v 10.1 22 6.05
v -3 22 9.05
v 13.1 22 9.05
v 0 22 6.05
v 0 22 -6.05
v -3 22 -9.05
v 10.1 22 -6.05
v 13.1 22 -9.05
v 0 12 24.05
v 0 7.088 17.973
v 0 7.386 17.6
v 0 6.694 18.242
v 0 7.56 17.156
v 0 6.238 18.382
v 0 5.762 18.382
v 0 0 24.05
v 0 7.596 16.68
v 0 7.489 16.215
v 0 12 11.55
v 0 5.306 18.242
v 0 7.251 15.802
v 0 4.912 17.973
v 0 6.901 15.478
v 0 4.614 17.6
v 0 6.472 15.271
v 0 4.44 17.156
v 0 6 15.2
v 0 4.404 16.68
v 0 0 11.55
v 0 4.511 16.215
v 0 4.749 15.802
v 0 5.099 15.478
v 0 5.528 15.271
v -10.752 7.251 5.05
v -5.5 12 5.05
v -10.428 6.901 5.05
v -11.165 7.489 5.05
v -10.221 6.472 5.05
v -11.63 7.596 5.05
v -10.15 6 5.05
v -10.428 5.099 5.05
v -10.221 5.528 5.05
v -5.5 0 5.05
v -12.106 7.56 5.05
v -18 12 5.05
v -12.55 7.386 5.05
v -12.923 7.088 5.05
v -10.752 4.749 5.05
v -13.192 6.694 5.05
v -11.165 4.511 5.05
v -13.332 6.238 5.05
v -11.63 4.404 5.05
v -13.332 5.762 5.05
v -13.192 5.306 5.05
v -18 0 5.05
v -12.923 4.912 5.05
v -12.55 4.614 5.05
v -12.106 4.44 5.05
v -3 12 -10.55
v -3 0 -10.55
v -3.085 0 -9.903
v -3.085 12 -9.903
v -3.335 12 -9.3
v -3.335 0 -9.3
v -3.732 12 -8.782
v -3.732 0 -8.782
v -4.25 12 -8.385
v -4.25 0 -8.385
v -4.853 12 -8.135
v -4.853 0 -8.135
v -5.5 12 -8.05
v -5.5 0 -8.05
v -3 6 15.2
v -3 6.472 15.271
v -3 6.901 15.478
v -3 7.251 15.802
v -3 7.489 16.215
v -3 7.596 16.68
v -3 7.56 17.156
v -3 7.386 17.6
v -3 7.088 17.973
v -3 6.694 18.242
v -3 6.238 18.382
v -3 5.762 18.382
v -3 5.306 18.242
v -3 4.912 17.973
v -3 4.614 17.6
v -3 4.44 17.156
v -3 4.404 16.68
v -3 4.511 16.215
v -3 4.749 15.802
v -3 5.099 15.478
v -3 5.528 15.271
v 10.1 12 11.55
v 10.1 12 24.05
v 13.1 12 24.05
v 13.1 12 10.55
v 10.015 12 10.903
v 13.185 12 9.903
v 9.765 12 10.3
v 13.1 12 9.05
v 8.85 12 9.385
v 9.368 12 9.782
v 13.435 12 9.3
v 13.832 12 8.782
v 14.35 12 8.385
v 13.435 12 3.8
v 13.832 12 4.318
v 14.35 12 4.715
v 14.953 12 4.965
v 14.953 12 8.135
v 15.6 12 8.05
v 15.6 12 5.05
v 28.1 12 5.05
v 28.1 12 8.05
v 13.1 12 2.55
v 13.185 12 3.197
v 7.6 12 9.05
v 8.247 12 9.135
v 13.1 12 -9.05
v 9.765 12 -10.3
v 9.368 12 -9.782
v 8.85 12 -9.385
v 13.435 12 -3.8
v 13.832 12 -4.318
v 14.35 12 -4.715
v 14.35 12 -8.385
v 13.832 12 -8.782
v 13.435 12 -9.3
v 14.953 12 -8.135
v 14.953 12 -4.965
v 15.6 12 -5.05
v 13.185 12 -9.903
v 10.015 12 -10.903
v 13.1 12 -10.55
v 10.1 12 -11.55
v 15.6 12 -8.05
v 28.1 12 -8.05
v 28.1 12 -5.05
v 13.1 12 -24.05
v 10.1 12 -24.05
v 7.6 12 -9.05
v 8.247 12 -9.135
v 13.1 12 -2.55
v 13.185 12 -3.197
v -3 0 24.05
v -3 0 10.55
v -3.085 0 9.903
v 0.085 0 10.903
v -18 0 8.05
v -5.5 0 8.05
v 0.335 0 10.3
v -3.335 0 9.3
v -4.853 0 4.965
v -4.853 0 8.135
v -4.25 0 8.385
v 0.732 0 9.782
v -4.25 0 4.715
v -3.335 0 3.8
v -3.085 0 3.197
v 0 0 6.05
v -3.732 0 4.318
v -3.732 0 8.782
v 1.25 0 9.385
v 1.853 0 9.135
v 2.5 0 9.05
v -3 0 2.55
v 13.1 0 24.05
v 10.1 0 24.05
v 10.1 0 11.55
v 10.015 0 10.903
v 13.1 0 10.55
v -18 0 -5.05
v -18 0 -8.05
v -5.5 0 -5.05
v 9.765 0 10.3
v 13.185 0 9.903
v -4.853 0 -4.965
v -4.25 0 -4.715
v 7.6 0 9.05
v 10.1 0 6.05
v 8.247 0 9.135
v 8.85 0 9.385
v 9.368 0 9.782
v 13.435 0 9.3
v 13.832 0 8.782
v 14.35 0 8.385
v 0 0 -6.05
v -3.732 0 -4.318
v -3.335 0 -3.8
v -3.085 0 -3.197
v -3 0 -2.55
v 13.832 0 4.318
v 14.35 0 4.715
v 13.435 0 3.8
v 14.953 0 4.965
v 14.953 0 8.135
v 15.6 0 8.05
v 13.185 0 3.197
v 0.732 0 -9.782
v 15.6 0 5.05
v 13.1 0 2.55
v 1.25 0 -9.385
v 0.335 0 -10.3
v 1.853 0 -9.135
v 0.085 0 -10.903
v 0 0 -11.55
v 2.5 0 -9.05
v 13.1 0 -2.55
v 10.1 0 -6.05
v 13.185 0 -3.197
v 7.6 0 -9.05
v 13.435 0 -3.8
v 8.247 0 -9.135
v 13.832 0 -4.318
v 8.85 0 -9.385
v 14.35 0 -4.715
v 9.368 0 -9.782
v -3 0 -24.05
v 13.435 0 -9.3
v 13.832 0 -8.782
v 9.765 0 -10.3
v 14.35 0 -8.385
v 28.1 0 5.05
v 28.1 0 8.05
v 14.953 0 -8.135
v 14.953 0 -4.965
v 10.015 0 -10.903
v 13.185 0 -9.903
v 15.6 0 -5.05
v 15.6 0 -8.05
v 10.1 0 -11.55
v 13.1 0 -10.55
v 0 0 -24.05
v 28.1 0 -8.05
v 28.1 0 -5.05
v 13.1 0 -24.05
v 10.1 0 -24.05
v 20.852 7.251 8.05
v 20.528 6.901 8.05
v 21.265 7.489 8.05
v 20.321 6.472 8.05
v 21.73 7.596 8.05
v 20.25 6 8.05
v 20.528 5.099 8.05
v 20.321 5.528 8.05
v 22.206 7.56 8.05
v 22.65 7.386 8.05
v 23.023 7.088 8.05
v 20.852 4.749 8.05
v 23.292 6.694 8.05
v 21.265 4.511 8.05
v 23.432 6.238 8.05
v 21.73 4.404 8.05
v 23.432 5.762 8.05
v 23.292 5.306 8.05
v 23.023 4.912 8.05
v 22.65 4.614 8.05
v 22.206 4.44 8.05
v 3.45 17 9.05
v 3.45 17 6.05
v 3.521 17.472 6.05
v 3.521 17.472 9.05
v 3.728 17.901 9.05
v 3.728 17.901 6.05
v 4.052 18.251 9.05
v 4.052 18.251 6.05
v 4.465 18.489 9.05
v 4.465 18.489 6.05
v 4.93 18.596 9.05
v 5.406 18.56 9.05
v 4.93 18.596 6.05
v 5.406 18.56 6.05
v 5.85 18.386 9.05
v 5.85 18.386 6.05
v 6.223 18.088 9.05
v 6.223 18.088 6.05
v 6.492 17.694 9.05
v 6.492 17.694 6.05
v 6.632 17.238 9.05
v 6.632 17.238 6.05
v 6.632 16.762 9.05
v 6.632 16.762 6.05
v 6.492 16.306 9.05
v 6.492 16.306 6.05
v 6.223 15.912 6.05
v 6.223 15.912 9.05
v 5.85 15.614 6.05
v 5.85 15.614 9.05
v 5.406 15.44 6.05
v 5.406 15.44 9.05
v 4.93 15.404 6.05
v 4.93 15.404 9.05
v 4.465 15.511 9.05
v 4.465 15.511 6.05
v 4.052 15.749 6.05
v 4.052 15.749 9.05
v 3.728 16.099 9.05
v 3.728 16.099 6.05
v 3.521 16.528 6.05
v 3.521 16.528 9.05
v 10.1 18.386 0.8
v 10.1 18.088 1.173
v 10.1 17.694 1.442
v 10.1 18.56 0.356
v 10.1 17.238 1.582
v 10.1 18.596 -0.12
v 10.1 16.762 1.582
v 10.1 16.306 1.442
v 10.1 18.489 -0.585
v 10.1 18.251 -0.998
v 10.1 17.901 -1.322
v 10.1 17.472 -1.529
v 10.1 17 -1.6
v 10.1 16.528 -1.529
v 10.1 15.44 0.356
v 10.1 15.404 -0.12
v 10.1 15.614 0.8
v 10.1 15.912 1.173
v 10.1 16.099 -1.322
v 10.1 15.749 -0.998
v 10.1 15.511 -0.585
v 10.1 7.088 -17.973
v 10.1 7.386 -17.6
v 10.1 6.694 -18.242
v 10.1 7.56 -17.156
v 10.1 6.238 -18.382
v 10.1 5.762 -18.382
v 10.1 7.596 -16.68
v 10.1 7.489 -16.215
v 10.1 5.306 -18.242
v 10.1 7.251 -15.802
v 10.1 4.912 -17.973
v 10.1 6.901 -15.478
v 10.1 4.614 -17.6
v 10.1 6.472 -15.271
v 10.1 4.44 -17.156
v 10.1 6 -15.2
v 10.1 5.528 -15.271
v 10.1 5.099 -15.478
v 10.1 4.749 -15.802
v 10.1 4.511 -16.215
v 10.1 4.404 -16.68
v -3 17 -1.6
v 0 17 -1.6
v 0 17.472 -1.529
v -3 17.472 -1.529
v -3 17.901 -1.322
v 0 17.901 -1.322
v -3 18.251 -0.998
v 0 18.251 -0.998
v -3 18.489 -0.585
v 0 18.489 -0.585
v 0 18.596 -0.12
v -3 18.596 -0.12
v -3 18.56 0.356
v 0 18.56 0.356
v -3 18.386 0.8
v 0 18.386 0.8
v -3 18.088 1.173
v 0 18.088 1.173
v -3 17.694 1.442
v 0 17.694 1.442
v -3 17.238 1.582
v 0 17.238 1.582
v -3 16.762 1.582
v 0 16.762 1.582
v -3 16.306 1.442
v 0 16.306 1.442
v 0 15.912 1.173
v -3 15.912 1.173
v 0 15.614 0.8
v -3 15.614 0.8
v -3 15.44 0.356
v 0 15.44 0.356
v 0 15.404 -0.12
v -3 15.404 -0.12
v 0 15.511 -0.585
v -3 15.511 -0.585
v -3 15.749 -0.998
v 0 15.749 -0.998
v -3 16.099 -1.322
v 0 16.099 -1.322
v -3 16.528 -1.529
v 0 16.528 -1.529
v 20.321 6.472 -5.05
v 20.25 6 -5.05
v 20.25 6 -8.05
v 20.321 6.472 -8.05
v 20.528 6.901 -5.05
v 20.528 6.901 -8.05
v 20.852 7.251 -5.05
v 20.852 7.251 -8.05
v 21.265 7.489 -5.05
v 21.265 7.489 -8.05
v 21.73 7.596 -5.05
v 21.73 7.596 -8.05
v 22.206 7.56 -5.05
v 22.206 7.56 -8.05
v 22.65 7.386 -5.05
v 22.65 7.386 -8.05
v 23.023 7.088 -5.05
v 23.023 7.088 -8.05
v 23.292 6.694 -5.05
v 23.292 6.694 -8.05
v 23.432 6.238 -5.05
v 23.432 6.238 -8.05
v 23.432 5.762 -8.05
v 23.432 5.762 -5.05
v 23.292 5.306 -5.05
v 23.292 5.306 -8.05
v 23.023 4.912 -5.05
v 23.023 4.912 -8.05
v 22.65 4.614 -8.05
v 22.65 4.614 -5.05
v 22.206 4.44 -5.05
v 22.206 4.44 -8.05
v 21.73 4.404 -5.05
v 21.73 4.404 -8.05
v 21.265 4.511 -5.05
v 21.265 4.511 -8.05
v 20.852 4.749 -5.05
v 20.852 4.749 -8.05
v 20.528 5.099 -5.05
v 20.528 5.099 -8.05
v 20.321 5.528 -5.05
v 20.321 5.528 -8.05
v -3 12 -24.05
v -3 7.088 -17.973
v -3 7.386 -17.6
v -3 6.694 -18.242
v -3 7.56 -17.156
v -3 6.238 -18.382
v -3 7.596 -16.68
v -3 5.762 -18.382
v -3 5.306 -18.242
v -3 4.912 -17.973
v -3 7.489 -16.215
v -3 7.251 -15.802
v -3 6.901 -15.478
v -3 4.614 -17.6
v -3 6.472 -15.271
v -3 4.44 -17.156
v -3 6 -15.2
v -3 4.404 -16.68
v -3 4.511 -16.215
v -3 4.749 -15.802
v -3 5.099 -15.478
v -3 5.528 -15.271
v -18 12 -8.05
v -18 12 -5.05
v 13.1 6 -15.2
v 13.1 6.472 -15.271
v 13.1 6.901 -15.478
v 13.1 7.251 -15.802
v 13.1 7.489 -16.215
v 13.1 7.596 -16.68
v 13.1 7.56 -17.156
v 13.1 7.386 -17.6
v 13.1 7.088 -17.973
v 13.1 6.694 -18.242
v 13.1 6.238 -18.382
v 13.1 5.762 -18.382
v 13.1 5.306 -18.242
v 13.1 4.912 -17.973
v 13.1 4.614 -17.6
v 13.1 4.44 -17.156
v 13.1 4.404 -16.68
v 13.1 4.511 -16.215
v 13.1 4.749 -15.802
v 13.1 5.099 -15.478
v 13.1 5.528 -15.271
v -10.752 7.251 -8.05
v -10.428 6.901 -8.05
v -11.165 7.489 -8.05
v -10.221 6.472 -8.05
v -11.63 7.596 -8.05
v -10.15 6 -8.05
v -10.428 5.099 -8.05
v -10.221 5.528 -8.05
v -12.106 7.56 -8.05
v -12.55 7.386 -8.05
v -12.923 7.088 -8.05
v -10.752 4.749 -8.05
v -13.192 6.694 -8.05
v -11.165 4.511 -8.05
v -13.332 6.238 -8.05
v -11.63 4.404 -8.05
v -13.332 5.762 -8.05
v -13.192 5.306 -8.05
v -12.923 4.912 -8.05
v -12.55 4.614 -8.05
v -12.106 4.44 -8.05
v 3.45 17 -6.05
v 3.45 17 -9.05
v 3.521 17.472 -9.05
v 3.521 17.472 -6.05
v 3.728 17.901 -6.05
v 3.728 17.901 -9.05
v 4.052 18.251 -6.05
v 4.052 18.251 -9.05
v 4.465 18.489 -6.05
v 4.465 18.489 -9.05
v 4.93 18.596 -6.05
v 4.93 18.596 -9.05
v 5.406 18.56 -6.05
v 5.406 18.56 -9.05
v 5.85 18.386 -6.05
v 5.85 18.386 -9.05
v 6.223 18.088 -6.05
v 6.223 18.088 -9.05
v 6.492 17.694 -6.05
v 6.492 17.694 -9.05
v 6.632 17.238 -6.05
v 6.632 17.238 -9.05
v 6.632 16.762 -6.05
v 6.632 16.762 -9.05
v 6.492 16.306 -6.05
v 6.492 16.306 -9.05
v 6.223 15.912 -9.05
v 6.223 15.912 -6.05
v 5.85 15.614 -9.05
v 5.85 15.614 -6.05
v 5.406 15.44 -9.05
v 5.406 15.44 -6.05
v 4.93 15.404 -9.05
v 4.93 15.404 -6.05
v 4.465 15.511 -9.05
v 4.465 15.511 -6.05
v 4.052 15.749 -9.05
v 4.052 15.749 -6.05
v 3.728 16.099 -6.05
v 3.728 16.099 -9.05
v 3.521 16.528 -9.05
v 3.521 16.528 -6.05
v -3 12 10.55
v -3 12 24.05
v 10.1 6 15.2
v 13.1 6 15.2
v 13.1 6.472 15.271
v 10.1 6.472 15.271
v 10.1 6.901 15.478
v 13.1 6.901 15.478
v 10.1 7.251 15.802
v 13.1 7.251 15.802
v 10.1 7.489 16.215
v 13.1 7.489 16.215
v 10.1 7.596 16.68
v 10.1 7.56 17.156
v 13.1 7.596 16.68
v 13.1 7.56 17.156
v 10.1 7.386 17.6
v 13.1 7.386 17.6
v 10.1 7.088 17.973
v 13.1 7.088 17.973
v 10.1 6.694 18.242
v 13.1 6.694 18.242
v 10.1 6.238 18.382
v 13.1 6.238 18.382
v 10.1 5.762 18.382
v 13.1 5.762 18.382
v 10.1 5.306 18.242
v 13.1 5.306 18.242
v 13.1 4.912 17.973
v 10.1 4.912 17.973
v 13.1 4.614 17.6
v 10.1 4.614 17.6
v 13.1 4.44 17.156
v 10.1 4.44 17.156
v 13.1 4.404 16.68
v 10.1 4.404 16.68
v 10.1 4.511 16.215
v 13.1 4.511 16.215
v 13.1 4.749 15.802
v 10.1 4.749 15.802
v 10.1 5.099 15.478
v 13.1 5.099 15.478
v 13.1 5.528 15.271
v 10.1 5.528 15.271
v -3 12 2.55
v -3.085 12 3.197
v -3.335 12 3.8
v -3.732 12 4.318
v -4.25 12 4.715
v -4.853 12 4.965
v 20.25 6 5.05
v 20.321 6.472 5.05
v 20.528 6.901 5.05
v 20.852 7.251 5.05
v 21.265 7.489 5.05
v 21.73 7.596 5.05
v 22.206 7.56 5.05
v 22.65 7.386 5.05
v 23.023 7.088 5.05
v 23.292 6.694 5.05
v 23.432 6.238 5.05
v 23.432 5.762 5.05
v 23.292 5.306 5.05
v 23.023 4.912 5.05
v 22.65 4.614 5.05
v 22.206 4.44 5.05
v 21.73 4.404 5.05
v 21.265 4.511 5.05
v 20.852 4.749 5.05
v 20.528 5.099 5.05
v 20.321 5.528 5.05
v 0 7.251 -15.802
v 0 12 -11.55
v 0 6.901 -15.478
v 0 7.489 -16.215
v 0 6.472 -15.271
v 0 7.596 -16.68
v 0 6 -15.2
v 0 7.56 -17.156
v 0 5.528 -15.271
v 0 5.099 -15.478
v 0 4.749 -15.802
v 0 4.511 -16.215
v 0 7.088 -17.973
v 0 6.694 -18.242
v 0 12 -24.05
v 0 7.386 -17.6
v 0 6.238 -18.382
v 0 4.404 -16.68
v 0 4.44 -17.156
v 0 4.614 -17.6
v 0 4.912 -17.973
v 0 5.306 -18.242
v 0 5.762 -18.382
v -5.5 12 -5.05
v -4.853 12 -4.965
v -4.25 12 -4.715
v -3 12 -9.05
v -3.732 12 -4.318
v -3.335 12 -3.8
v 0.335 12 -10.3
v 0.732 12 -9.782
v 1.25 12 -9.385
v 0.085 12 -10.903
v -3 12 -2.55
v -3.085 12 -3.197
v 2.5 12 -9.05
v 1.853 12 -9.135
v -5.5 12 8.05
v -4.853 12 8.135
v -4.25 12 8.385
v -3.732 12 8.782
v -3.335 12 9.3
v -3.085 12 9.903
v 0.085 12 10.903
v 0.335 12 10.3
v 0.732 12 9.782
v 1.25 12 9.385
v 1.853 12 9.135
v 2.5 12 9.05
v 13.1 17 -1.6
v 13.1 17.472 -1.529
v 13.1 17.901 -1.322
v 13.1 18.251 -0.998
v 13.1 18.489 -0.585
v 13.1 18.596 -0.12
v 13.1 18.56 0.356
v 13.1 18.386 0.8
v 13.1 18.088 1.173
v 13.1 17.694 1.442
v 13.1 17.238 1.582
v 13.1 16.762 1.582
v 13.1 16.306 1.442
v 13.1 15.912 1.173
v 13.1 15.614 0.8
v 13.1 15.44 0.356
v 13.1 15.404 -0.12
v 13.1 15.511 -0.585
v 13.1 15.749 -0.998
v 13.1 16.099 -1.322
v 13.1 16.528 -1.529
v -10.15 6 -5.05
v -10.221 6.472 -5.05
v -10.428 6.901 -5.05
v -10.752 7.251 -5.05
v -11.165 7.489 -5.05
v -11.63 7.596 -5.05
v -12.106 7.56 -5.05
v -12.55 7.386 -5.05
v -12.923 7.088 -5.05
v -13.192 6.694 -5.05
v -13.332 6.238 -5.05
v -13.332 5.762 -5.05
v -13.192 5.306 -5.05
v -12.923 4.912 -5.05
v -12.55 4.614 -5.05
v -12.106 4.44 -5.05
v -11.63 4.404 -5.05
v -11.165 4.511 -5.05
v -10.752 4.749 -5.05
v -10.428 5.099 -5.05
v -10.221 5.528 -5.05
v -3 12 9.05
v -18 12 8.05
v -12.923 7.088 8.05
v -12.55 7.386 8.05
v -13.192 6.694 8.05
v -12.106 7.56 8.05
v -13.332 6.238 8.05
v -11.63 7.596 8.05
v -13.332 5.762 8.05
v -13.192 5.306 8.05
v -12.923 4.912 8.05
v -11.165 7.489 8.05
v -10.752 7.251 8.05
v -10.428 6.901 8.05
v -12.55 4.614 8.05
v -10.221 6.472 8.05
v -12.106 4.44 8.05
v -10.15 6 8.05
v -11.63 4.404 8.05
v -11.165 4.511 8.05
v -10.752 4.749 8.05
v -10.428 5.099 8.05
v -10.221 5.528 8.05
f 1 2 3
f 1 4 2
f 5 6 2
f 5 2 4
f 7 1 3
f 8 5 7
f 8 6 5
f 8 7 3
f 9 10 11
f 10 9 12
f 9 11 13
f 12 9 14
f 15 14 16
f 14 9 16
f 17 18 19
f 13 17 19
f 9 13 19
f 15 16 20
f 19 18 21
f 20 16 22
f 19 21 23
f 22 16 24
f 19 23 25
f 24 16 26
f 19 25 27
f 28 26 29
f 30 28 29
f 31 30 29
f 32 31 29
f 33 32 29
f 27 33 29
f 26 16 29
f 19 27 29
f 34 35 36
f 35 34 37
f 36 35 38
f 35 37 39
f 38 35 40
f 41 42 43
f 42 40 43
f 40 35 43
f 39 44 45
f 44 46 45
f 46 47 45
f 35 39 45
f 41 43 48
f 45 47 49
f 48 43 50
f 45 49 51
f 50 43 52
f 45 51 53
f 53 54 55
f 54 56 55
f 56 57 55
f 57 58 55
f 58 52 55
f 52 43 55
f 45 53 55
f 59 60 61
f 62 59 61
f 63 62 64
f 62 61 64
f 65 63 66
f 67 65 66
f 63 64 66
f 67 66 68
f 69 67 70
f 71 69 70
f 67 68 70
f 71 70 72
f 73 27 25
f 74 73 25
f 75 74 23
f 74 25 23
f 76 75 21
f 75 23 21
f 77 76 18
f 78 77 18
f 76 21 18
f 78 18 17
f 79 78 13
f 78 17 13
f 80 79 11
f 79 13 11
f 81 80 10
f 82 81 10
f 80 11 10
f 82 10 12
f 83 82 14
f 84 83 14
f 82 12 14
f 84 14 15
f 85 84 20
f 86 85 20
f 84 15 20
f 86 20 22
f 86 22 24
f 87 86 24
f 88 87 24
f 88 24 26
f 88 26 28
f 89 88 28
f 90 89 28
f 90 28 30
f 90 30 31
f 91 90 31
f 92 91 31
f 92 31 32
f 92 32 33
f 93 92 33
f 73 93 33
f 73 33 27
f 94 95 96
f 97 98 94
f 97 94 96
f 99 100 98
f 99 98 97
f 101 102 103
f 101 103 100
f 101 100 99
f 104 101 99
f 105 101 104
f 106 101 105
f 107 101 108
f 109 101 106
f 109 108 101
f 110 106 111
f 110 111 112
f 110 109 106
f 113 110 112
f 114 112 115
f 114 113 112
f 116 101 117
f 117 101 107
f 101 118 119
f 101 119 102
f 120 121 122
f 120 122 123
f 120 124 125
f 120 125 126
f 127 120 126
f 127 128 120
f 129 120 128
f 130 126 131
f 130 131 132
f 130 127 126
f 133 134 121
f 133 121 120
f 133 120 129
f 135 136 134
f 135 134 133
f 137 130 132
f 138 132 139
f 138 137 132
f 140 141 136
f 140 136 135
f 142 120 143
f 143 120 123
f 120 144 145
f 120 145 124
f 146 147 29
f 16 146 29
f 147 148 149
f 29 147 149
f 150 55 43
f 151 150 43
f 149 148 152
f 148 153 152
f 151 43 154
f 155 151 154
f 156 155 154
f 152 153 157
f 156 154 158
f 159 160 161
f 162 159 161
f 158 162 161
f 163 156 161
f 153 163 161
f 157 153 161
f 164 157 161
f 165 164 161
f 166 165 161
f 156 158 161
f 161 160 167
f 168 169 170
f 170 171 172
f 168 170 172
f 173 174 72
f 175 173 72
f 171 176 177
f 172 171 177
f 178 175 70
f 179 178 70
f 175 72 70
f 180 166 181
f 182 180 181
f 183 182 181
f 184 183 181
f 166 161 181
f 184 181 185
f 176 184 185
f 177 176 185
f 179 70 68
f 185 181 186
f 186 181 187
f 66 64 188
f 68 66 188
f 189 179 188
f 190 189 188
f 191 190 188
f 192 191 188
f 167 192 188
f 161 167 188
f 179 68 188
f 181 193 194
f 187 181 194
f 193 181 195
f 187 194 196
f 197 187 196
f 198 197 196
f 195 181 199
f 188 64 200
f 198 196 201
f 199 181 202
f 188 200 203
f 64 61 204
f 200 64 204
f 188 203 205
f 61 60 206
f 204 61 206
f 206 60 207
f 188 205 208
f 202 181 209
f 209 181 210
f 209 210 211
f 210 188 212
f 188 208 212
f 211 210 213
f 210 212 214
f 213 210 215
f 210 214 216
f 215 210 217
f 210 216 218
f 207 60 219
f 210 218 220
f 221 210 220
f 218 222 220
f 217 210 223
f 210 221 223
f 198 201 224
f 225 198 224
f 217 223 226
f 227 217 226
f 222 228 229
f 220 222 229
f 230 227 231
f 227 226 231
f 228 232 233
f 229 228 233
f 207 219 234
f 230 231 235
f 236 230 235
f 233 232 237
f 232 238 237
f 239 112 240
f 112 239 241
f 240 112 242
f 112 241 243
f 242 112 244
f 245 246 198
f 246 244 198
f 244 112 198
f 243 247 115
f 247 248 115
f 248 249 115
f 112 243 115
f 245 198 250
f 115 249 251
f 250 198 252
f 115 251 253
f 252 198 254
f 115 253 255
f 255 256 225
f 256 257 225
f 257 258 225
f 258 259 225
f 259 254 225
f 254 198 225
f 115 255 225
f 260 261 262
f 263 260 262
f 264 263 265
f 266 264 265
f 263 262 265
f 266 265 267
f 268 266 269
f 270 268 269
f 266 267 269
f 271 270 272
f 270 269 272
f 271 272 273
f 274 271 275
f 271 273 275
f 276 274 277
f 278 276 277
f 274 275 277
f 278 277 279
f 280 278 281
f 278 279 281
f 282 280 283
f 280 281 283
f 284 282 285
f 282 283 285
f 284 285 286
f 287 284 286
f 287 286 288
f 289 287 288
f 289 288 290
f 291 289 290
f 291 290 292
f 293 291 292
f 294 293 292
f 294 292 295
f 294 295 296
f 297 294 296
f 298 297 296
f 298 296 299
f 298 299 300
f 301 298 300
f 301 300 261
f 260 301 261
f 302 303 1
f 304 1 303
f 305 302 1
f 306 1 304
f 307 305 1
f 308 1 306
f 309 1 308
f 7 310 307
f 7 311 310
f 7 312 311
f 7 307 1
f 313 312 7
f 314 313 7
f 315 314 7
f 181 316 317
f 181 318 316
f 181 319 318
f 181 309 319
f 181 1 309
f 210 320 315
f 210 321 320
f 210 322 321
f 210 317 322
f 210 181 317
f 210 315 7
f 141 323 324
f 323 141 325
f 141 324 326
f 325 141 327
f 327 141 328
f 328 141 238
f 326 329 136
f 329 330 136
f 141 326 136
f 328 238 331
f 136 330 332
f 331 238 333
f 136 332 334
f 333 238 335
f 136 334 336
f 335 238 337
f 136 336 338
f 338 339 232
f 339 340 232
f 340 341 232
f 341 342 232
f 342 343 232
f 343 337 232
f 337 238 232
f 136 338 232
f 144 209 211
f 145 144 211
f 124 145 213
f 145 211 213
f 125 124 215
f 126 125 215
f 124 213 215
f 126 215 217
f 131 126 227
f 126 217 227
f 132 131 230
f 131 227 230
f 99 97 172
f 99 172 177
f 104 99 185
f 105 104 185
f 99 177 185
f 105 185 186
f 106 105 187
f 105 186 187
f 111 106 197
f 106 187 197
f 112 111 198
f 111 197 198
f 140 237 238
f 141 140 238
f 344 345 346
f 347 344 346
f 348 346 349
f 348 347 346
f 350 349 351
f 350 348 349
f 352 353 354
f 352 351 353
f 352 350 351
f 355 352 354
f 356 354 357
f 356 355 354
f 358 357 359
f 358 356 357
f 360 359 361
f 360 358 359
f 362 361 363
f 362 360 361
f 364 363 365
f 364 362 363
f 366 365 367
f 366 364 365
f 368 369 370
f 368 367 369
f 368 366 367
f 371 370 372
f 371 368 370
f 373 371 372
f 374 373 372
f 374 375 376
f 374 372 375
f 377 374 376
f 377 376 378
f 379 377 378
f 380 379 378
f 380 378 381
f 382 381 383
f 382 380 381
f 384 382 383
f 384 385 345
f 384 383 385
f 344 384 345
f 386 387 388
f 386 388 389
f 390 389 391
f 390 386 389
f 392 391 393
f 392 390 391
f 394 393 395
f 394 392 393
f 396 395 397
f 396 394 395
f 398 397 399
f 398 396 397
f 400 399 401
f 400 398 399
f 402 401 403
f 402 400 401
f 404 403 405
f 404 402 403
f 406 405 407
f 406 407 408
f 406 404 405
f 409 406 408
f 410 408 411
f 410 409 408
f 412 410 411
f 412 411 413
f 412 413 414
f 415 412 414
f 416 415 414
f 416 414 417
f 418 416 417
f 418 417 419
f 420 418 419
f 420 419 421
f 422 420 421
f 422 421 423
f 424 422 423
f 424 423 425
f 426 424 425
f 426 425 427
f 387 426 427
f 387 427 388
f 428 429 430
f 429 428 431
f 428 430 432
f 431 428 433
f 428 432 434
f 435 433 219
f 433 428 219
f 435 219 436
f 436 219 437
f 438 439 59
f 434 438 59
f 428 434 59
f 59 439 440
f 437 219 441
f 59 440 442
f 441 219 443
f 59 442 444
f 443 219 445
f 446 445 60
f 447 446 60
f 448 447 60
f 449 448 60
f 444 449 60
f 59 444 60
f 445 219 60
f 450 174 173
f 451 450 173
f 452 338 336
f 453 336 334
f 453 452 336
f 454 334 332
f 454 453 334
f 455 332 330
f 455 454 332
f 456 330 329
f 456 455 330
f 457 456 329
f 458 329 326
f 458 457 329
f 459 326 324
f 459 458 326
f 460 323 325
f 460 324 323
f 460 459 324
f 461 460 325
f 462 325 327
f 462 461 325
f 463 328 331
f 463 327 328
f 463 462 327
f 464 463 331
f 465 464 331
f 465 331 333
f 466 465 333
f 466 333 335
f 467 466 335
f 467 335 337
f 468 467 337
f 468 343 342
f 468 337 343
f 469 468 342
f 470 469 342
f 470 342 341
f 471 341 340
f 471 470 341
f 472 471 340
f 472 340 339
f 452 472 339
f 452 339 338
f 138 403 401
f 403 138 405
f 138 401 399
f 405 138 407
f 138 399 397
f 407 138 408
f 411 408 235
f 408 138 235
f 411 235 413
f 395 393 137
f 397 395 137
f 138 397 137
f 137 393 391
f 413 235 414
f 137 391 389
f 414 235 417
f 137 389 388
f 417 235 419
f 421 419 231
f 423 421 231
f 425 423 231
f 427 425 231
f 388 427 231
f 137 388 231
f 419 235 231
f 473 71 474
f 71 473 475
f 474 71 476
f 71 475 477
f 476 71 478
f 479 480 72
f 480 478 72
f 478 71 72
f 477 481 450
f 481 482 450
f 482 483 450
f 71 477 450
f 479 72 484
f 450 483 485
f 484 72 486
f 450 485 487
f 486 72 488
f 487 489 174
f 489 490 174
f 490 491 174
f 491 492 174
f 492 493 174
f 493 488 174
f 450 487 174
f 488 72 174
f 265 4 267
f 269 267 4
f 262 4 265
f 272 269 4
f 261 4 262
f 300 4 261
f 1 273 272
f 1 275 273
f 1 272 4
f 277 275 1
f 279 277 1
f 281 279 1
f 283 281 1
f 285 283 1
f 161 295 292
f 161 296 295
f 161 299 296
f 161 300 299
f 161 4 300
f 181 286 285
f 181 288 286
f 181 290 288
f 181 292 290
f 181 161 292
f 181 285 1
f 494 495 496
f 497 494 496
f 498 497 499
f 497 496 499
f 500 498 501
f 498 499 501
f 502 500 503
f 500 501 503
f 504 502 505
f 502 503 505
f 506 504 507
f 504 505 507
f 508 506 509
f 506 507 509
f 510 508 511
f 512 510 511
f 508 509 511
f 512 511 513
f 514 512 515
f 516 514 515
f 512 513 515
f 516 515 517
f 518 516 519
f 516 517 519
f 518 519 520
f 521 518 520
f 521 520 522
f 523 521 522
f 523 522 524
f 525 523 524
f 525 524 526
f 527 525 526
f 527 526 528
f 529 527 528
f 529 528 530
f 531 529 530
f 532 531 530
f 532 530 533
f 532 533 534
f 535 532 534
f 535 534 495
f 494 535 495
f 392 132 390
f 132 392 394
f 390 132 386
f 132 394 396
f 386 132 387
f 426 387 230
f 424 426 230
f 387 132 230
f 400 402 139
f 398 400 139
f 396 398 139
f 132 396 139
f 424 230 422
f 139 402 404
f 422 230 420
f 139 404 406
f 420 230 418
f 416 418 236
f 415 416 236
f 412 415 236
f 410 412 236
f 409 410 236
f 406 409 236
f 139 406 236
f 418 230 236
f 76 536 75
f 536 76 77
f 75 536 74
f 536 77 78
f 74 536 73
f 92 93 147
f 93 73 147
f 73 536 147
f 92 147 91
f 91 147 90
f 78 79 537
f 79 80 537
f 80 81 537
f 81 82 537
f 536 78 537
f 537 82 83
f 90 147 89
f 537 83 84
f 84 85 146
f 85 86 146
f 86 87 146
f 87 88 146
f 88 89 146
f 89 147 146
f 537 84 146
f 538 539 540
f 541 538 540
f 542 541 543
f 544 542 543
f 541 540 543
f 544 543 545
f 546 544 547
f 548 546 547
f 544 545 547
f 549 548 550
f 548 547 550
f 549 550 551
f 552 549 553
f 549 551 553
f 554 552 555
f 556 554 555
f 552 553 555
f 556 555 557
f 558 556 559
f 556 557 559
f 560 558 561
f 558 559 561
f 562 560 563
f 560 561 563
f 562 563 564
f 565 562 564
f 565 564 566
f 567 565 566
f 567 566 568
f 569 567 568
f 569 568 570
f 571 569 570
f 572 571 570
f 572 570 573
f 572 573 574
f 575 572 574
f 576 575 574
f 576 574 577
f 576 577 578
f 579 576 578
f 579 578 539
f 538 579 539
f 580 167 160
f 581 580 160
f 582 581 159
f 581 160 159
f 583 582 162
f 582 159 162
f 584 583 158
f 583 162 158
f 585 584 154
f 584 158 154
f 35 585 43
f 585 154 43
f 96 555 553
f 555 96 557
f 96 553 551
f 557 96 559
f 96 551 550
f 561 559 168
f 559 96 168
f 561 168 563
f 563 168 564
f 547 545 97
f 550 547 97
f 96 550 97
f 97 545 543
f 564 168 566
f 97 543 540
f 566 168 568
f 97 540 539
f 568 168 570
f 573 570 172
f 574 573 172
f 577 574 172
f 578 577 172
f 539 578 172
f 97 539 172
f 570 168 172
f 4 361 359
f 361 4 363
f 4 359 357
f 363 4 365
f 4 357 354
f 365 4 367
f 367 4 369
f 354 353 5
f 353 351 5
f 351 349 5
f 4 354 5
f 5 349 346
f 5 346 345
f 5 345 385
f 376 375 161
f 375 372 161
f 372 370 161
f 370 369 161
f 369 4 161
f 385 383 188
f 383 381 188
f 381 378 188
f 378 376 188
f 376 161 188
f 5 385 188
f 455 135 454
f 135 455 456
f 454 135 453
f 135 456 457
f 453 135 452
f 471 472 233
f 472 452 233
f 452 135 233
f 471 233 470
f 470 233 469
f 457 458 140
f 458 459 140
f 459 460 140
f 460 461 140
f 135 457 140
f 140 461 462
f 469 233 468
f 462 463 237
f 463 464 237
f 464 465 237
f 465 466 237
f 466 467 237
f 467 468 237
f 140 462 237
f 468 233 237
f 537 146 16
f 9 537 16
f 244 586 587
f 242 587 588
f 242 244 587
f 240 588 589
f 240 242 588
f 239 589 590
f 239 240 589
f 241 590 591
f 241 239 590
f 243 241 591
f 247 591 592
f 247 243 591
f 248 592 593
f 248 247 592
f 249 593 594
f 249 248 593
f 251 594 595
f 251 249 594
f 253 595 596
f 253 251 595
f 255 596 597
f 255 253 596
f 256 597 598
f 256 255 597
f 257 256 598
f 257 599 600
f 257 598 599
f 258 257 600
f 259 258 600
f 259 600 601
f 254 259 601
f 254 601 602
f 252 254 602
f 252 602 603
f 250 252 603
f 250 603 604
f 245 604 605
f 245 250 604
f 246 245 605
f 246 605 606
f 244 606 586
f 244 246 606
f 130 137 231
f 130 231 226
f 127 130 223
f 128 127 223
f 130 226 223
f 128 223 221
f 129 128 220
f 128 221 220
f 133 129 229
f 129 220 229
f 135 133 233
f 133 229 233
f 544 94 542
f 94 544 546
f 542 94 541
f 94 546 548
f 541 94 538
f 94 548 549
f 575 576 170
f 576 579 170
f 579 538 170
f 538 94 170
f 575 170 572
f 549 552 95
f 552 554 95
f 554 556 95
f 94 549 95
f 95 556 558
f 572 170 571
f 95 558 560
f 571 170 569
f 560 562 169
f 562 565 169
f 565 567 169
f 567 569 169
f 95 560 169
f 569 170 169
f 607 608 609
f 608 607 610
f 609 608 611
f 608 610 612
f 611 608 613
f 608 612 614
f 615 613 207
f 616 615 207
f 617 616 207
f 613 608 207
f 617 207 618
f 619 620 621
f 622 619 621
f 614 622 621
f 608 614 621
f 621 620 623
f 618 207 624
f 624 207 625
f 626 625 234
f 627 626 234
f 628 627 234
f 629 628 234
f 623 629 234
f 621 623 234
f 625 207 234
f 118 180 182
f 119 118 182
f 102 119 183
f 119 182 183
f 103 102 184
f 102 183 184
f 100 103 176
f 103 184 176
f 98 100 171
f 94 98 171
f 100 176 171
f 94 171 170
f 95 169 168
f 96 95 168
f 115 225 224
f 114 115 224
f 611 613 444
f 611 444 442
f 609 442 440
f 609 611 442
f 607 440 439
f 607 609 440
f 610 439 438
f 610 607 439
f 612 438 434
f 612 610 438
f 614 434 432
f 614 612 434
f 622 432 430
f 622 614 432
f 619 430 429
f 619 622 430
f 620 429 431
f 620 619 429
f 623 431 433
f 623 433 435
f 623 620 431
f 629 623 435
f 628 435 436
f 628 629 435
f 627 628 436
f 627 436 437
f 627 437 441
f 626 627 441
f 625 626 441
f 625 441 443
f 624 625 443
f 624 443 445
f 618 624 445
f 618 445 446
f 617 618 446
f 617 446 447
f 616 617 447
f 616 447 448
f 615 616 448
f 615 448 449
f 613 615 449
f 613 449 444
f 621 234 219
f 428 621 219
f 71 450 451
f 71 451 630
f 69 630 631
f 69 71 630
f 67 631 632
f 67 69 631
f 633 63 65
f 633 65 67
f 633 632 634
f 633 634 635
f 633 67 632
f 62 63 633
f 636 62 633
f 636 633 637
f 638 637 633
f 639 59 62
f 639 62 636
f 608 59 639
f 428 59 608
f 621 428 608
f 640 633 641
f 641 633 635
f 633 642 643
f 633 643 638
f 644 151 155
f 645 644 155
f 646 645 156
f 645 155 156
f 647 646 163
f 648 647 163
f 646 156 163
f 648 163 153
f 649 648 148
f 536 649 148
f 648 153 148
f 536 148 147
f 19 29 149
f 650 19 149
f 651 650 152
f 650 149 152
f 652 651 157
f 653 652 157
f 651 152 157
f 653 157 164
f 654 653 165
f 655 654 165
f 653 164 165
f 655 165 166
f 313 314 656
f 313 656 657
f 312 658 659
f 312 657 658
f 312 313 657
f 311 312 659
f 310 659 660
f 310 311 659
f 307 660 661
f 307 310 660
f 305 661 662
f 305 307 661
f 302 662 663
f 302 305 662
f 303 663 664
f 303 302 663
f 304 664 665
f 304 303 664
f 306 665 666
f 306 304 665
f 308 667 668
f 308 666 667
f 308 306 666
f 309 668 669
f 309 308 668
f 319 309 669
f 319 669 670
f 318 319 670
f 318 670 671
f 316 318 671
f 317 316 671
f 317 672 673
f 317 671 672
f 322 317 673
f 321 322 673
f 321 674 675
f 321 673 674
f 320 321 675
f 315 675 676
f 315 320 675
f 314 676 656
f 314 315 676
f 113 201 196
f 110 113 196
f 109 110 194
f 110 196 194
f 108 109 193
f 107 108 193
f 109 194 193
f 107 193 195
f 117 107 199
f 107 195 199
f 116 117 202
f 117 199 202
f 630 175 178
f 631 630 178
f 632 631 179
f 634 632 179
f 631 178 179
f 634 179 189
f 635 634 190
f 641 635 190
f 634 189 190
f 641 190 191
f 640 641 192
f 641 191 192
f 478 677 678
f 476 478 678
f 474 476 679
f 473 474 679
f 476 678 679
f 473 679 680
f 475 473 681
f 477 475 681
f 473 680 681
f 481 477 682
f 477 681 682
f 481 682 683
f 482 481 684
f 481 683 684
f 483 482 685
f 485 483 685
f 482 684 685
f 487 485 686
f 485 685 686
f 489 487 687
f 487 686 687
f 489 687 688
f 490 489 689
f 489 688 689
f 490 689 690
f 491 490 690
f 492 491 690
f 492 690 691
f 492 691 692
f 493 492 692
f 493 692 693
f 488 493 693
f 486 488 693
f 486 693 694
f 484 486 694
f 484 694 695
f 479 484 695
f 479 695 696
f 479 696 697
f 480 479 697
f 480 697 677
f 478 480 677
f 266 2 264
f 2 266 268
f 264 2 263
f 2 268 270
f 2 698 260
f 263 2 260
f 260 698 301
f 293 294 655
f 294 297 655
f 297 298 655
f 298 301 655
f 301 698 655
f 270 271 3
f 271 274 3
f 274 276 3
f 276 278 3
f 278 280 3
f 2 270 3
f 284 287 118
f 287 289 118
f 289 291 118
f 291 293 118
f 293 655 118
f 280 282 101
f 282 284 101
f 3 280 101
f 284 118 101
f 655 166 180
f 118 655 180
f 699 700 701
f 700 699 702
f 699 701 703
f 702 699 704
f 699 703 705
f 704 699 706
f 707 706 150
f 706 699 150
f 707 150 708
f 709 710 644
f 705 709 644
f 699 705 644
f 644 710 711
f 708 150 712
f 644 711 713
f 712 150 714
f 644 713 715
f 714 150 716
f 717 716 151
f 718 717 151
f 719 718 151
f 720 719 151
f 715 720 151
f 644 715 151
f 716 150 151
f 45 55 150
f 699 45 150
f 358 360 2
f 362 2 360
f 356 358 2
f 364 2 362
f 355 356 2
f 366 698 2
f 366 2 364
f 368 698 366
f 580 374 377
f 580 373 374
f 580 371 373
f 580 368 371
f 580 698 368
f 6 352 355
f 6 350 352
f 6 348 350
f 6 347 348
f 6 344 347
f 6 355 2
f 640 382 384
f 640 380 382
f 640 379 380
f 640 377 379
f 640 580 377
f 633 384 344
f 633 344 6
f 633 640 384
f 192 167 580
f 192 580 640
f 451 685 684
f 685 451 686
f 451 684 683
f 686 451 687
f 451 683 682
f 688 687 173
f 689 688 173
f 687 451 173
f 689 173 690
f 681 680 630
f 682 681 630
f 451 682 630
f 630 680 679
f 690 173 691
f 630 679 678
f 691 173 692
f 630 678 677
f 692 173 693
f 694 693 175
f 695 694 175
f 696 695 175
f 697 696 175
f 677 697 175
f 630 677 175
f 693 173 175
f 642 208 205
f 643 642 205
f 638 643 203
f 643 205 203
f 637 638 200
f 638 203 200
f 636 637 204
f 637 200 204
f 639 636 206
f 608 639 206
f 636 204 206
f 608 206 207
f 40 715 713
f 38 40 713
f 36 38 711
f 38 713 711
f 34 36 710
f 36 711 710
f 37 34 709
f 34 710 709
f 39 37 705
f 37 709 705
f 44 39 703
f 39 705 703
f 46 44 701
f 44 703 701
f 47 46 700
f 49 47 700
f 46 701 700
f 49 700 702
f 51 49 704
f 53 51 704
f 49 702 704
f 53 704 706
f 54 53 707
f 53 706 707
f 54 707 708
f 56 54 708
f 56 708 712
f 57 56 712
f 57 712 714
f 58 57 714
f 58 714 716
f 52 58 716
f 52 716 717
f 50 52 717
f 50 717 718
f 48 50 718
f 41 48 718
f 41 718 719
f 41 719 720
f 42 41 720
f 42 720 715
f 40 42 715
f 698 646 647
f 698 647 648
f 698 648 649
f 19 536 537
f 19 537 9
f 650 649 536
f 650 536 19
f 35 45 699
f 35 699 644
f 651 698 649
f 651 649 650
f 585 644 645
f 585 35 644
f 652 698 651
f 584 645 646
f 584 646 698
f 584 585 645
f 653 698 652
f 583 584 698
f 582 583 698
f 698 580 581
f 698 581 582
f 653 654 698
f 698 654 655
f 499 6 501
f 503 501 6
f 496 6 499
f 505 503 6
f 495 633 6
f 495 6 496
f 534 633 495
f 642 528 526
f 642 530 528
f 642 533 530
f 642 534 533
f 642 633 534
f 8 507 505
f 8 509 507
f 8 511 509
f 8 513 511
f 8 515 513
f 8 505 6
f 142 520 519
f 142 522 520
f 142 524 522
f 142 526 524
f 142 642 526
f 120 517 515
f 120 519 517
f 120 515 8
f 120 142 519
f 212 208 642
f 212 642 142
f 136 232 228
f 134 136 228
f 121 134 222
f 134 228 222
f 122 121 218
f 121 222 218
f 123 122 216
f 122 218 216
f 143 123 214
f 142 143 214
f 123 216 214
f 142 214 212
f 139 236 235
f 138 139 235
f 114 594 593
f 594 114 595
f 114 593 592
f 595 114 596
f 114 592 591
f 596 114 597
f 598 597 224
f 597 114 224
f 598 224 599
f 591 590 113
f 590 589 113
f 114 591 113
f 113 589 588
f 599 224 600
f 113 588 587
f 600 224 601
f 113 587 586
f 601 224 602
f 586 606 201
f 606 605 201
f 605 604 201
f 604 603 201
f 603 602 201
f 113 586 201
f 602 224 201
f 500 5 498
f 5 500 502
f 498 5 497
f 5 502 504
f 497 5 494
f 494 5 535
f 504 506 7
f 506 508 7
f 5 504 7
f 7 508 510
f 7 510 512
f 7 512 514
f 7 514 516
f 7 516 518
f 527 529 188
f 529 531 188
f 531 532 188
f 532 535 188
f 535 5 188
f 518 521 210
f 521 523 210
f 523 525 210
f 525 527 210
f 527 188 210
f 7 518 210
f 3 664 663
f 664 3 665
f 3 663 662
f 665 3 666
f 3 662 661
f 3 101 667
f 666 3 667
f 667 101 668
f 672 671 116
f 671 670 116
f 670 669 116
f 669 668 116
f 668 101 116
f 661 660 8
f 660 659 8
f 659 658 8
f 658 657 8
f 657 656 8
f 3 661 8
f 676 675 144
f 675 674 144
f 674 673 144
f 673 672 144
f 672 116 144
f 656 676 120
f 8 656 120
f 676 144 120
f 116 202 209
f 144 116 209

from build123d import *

# Parameters (mm, degrees)
ESQUISSE2_W               = 10.1
ESQUISSE2_H               = 12.1
BOSS_EXTRU_1_DEPTH        = 12
ENL_V_MAT_EXTRU_1_REACH   = 46.317
ESQUISSE3_R               = 1.6
SYM_TRIE6_COPY_1_REACH    = 46.317
SYM_TRIE6_COPY_1_SKETCH_R = 1.6
ESQUISSE4_W               = 16.1
ESQUISSE4_H               = 18.1
ESQUISSE4_W_2             = 10.1
ESQUISSE4_H_2             = 12.1
EXTRU_MINCE1_DEPTH        = 10
ESQUISSE5_R               = 1.6
ENL_V_MAT_EXTRU_2_DEPTH   = 49.674634051


with BuildPart() as part:
    # Esquisse2 → Boss.-Extru.1 (new body)
    with BuildSketch(Plane(origin=(0, 0, 0), x_dir=(1, 0, 0), z_dir=(0, 1, 0))):
        with BuildLine():
            Line((0, 11.55), (0, 24.05))
            Line((0, 24.05), (-3, 24.05))
            Line((-3, 24.05), (-3, 10.55))
            ThreePointArc((-3, 10.55), (-3.732233047, 8.782233047), (-5.5, 8.05))
            Line((-5.5, 8.05), (-18, 8.05))
            Line((-18, 8.05), (-18, 5.05))
            Line((-18, 5.05), (-5.5, 5.05))
            ThreePointArc((-5.5, 5.05), (-3.732233047, 4.317766953), (-3, 2.55))
            Line((-3, 2.55), (-3, -2.55))
            ThreePointArc((-3, -2.55), (-3.732233047, -4.317766953), (-5.5, -5.05))
            Line((-5.5, -5.05), (-18, -5.05))
            Line((-18, -5.05), (-18, -8.05))
            Line((-18, -8.05), (-5.5, -8.05))
            ThreePointArc((-5.5, -8.05), (-3.732233047, -8.782233047), (-3, -10.55))
            Line((-3, -10.55), (-3, -24.05))
            Line((-3, -24.05), (0, -24.05))
            Line((0, -24.05), (0, -11.55))
            ThreePointArc((0, -11.55), (0.732233047, -9.782233047), (2.5, -9.05))
            Line((2.5, -9.05), (7.6, -9.05))
            ThreePointArc((7.6, -9.05), (9.367766953, -9.782233047), (10.1, -11.55))
            Line((10.1, -11.55), (10.1, -24.05))
            Line((10.1, -24.05), (13.1, -24.05))
            Line((13.1, -24.05), (13.1, -10.55))
            ThreePointArc((13.1, -10.55), (13.832233047, -8.782233047), (15.6, -8.05))
            Line((15.6, -8.05), (28.1, -8.05))
            Line((28.1, -8.05), (28.1, -5.05))
            Line((28.1, -5.05), (15.6, -5.05))
            ThreePointArc((15.6, -5.05), (13.832233047, -4.317766953), (13.1, -2.55))
            Line((13.1, -2.55), (13.1, 2.55))
            ThreePointArc((13.1, 2.55), (13.832233047, 4.317766953), (15.6, 5.05))
            Line((15.6, 5.05), (28.1, 5.05))
            Line((28.1, 5.05), (28.1, 8.05))
            Line((28.1, 8.05), (15.6, 8.05))
            ThreePointArc((15.6, 8.05), (13.832233047, 8.782233047), (13.1, 10.55))
            Line((13.1, 10.55), (13.1, 24.05))
            Line((13.1, 24.05), (10.1, 24.05))
            Line((10.1, 24.05), (10.1, 11.55))
            ThreePointArc((10.1, 11.55), (9.367766953, 9.782233047), (7.6, 9.05))
            Line((7.6, 9.05), (2.5, 9.05))
            ThreePointArc((2.5, 9.05), (0.732233047, 9.782233047), (0, 11.55))
        make_face()
        with Locations((5.05, 0)):
            Rectangle(ESQUISSE2_W, ESQUISSE2_H, mode=Mode.SUBTRACT)
    extrude(amount=BOSS_EXTRU_1_DEPTH)

    # Enlèv. mat.-Extru.1: up to this face of the body (flat: up to its plane)
    enl_v_mat_extru_1_end = Plane(part.part.faces().sort_by_distance((-11.75, 6, -8.05))[0])
    # Esquisse3 → Enlèv. mat.-Extru.1 (cut, up to the picked face)
    with BuildSketch(Plane.XY.offset(8.05), mode=Mode.PRIVATE) as enl_v_mat_extru_1_sk1:
        with Locations((-11.75, 6)):
            Circle(ESQUISSE3_R)
    enl_v_mat_extru_1_tool1 = split(extrude(enl_v_mat_extru_1_sk1.sketch, amount=-ENL_V_MAT_EXTRU_1_REACH, mode=Mode.PRIVATE), bisect_by=enl_v_mat_extru_1_end, keep=Keep.BOTH, mode=Mode.PRIVATE)
    enl_v_mat_extru_1 = enl_v_mat_extru_1_tool1.solids().sort_by(Axis((-11.75, 6, 8.05), (0, 0, -1)))[0]
    add(enl_v_mat_extru_1, mode=Mode.SUBTRACT)

    # Symétrie1: Enlèv. mat.-Extru.1 across plane
    add(enl_v_mat_extru_1.mirror(Plane(origin=(5.05, 0, 0), x_dir=(0, 0, 1), z_dir=(1, 0, 0))), mode=Mode.SUBTRACT)

    # Symétrie6: Enlèv. mat.-Extru.1 across plane
    add(enl_v_mat_extru_1.mirror(Plane(origin=(2.525, 0, -2.525), x_dir=(0.7071067811865478, 0, 0.7071067811865472), z_dir=(-0.7071067811865475, 0, 0.7071067811865477))), mode=Mode.SUBTRACT)

    # Symétrie6 copy 1: up to this face of the body (flat: up to its plane)
    sym_trie6_copy_1_end = Plane(part.part.faces().sort_by_distance((-3, 6, 16.8))[0])
    # Symétrie6 copy 1 sketch → Symétrie6 copy 1 (cut, up to the picked face)
    with BuildSketch(Plane(origin=(13.1, 0, 5.05), x_dir=(0, 0, -1), z_dir=(1, 0, 0)), mode=Mode.PRIVATE) as sym_trie6_copy_1_sk1:
        with Locations((-11.75, 6)):
            Circle(SYM_TRIE6_COPY_1_SKETCH_R)
    sym_trie6_copy_1_tool1 = split(extrude(sym_trie6_copy_1_sk1.sketch, amount=-SYM_TRIE6_COPY_1_REACH, mode=Mode.PRIVATE), bisect_by=sym_trie6_copy_1_end, keep=Keep.BOTH, mode=Mode.PRIVATE)
    add(sym_trie6_copy_1_tool1.solids().sort_by(Axis((13.1, 6, 16.8), (-1, 0, 0)))[0], mode=Mode.SUBTRACT)

    # Esquisse4 → Extru.-Mince1 (add)
    with BuildSketch(Plane(origin=(0, 12, 0), x_dir=(1, 0, 0), z_dir=(0, 1, 0))):
        with Locations((5.05, 0)):
            Rectangle(ESQUISSE4_W, ESQUISSE4_H)
        with Locations((5.05, 0)):
            Rectangle(ESQUISSE4_W_2, ESQUISSE4_H_2, mode=Mode.SUBTRACT)
    extrude(amount=EXTRU_MINCE1_DEPTH)

    # Esquisse5 → Enlèv. mat.-Extru.2 (cut, through all)
    with BuildSketch(Plane(origin=(0, 0, -9.05), x_dir=(-1, 0, 0), z_dir=(0, 0, -1))):
        with Locations((-5.05, 17)):
            Circle(ESQUISSE5_R)
    enl_v_mat_extru_2 = extrude(amount=-ENL_V_MAT_EXTRU_2_DEPTH, mode=Mode.SUBTRACT)

    # Symétrie10: Enlèv. mat.-Extru.2 across plane
    add(enl_v_mat_extru_2.mirror(Plane(origin=(2.525, 0, -2.525), x_dir=(0.7071067811865478, 0, 0.7071067811865472), z_dir=(-0.7071067811865475, 0, 0.7071067811865477))), mode=Mode.SUBTRACT)


solid = part.part
